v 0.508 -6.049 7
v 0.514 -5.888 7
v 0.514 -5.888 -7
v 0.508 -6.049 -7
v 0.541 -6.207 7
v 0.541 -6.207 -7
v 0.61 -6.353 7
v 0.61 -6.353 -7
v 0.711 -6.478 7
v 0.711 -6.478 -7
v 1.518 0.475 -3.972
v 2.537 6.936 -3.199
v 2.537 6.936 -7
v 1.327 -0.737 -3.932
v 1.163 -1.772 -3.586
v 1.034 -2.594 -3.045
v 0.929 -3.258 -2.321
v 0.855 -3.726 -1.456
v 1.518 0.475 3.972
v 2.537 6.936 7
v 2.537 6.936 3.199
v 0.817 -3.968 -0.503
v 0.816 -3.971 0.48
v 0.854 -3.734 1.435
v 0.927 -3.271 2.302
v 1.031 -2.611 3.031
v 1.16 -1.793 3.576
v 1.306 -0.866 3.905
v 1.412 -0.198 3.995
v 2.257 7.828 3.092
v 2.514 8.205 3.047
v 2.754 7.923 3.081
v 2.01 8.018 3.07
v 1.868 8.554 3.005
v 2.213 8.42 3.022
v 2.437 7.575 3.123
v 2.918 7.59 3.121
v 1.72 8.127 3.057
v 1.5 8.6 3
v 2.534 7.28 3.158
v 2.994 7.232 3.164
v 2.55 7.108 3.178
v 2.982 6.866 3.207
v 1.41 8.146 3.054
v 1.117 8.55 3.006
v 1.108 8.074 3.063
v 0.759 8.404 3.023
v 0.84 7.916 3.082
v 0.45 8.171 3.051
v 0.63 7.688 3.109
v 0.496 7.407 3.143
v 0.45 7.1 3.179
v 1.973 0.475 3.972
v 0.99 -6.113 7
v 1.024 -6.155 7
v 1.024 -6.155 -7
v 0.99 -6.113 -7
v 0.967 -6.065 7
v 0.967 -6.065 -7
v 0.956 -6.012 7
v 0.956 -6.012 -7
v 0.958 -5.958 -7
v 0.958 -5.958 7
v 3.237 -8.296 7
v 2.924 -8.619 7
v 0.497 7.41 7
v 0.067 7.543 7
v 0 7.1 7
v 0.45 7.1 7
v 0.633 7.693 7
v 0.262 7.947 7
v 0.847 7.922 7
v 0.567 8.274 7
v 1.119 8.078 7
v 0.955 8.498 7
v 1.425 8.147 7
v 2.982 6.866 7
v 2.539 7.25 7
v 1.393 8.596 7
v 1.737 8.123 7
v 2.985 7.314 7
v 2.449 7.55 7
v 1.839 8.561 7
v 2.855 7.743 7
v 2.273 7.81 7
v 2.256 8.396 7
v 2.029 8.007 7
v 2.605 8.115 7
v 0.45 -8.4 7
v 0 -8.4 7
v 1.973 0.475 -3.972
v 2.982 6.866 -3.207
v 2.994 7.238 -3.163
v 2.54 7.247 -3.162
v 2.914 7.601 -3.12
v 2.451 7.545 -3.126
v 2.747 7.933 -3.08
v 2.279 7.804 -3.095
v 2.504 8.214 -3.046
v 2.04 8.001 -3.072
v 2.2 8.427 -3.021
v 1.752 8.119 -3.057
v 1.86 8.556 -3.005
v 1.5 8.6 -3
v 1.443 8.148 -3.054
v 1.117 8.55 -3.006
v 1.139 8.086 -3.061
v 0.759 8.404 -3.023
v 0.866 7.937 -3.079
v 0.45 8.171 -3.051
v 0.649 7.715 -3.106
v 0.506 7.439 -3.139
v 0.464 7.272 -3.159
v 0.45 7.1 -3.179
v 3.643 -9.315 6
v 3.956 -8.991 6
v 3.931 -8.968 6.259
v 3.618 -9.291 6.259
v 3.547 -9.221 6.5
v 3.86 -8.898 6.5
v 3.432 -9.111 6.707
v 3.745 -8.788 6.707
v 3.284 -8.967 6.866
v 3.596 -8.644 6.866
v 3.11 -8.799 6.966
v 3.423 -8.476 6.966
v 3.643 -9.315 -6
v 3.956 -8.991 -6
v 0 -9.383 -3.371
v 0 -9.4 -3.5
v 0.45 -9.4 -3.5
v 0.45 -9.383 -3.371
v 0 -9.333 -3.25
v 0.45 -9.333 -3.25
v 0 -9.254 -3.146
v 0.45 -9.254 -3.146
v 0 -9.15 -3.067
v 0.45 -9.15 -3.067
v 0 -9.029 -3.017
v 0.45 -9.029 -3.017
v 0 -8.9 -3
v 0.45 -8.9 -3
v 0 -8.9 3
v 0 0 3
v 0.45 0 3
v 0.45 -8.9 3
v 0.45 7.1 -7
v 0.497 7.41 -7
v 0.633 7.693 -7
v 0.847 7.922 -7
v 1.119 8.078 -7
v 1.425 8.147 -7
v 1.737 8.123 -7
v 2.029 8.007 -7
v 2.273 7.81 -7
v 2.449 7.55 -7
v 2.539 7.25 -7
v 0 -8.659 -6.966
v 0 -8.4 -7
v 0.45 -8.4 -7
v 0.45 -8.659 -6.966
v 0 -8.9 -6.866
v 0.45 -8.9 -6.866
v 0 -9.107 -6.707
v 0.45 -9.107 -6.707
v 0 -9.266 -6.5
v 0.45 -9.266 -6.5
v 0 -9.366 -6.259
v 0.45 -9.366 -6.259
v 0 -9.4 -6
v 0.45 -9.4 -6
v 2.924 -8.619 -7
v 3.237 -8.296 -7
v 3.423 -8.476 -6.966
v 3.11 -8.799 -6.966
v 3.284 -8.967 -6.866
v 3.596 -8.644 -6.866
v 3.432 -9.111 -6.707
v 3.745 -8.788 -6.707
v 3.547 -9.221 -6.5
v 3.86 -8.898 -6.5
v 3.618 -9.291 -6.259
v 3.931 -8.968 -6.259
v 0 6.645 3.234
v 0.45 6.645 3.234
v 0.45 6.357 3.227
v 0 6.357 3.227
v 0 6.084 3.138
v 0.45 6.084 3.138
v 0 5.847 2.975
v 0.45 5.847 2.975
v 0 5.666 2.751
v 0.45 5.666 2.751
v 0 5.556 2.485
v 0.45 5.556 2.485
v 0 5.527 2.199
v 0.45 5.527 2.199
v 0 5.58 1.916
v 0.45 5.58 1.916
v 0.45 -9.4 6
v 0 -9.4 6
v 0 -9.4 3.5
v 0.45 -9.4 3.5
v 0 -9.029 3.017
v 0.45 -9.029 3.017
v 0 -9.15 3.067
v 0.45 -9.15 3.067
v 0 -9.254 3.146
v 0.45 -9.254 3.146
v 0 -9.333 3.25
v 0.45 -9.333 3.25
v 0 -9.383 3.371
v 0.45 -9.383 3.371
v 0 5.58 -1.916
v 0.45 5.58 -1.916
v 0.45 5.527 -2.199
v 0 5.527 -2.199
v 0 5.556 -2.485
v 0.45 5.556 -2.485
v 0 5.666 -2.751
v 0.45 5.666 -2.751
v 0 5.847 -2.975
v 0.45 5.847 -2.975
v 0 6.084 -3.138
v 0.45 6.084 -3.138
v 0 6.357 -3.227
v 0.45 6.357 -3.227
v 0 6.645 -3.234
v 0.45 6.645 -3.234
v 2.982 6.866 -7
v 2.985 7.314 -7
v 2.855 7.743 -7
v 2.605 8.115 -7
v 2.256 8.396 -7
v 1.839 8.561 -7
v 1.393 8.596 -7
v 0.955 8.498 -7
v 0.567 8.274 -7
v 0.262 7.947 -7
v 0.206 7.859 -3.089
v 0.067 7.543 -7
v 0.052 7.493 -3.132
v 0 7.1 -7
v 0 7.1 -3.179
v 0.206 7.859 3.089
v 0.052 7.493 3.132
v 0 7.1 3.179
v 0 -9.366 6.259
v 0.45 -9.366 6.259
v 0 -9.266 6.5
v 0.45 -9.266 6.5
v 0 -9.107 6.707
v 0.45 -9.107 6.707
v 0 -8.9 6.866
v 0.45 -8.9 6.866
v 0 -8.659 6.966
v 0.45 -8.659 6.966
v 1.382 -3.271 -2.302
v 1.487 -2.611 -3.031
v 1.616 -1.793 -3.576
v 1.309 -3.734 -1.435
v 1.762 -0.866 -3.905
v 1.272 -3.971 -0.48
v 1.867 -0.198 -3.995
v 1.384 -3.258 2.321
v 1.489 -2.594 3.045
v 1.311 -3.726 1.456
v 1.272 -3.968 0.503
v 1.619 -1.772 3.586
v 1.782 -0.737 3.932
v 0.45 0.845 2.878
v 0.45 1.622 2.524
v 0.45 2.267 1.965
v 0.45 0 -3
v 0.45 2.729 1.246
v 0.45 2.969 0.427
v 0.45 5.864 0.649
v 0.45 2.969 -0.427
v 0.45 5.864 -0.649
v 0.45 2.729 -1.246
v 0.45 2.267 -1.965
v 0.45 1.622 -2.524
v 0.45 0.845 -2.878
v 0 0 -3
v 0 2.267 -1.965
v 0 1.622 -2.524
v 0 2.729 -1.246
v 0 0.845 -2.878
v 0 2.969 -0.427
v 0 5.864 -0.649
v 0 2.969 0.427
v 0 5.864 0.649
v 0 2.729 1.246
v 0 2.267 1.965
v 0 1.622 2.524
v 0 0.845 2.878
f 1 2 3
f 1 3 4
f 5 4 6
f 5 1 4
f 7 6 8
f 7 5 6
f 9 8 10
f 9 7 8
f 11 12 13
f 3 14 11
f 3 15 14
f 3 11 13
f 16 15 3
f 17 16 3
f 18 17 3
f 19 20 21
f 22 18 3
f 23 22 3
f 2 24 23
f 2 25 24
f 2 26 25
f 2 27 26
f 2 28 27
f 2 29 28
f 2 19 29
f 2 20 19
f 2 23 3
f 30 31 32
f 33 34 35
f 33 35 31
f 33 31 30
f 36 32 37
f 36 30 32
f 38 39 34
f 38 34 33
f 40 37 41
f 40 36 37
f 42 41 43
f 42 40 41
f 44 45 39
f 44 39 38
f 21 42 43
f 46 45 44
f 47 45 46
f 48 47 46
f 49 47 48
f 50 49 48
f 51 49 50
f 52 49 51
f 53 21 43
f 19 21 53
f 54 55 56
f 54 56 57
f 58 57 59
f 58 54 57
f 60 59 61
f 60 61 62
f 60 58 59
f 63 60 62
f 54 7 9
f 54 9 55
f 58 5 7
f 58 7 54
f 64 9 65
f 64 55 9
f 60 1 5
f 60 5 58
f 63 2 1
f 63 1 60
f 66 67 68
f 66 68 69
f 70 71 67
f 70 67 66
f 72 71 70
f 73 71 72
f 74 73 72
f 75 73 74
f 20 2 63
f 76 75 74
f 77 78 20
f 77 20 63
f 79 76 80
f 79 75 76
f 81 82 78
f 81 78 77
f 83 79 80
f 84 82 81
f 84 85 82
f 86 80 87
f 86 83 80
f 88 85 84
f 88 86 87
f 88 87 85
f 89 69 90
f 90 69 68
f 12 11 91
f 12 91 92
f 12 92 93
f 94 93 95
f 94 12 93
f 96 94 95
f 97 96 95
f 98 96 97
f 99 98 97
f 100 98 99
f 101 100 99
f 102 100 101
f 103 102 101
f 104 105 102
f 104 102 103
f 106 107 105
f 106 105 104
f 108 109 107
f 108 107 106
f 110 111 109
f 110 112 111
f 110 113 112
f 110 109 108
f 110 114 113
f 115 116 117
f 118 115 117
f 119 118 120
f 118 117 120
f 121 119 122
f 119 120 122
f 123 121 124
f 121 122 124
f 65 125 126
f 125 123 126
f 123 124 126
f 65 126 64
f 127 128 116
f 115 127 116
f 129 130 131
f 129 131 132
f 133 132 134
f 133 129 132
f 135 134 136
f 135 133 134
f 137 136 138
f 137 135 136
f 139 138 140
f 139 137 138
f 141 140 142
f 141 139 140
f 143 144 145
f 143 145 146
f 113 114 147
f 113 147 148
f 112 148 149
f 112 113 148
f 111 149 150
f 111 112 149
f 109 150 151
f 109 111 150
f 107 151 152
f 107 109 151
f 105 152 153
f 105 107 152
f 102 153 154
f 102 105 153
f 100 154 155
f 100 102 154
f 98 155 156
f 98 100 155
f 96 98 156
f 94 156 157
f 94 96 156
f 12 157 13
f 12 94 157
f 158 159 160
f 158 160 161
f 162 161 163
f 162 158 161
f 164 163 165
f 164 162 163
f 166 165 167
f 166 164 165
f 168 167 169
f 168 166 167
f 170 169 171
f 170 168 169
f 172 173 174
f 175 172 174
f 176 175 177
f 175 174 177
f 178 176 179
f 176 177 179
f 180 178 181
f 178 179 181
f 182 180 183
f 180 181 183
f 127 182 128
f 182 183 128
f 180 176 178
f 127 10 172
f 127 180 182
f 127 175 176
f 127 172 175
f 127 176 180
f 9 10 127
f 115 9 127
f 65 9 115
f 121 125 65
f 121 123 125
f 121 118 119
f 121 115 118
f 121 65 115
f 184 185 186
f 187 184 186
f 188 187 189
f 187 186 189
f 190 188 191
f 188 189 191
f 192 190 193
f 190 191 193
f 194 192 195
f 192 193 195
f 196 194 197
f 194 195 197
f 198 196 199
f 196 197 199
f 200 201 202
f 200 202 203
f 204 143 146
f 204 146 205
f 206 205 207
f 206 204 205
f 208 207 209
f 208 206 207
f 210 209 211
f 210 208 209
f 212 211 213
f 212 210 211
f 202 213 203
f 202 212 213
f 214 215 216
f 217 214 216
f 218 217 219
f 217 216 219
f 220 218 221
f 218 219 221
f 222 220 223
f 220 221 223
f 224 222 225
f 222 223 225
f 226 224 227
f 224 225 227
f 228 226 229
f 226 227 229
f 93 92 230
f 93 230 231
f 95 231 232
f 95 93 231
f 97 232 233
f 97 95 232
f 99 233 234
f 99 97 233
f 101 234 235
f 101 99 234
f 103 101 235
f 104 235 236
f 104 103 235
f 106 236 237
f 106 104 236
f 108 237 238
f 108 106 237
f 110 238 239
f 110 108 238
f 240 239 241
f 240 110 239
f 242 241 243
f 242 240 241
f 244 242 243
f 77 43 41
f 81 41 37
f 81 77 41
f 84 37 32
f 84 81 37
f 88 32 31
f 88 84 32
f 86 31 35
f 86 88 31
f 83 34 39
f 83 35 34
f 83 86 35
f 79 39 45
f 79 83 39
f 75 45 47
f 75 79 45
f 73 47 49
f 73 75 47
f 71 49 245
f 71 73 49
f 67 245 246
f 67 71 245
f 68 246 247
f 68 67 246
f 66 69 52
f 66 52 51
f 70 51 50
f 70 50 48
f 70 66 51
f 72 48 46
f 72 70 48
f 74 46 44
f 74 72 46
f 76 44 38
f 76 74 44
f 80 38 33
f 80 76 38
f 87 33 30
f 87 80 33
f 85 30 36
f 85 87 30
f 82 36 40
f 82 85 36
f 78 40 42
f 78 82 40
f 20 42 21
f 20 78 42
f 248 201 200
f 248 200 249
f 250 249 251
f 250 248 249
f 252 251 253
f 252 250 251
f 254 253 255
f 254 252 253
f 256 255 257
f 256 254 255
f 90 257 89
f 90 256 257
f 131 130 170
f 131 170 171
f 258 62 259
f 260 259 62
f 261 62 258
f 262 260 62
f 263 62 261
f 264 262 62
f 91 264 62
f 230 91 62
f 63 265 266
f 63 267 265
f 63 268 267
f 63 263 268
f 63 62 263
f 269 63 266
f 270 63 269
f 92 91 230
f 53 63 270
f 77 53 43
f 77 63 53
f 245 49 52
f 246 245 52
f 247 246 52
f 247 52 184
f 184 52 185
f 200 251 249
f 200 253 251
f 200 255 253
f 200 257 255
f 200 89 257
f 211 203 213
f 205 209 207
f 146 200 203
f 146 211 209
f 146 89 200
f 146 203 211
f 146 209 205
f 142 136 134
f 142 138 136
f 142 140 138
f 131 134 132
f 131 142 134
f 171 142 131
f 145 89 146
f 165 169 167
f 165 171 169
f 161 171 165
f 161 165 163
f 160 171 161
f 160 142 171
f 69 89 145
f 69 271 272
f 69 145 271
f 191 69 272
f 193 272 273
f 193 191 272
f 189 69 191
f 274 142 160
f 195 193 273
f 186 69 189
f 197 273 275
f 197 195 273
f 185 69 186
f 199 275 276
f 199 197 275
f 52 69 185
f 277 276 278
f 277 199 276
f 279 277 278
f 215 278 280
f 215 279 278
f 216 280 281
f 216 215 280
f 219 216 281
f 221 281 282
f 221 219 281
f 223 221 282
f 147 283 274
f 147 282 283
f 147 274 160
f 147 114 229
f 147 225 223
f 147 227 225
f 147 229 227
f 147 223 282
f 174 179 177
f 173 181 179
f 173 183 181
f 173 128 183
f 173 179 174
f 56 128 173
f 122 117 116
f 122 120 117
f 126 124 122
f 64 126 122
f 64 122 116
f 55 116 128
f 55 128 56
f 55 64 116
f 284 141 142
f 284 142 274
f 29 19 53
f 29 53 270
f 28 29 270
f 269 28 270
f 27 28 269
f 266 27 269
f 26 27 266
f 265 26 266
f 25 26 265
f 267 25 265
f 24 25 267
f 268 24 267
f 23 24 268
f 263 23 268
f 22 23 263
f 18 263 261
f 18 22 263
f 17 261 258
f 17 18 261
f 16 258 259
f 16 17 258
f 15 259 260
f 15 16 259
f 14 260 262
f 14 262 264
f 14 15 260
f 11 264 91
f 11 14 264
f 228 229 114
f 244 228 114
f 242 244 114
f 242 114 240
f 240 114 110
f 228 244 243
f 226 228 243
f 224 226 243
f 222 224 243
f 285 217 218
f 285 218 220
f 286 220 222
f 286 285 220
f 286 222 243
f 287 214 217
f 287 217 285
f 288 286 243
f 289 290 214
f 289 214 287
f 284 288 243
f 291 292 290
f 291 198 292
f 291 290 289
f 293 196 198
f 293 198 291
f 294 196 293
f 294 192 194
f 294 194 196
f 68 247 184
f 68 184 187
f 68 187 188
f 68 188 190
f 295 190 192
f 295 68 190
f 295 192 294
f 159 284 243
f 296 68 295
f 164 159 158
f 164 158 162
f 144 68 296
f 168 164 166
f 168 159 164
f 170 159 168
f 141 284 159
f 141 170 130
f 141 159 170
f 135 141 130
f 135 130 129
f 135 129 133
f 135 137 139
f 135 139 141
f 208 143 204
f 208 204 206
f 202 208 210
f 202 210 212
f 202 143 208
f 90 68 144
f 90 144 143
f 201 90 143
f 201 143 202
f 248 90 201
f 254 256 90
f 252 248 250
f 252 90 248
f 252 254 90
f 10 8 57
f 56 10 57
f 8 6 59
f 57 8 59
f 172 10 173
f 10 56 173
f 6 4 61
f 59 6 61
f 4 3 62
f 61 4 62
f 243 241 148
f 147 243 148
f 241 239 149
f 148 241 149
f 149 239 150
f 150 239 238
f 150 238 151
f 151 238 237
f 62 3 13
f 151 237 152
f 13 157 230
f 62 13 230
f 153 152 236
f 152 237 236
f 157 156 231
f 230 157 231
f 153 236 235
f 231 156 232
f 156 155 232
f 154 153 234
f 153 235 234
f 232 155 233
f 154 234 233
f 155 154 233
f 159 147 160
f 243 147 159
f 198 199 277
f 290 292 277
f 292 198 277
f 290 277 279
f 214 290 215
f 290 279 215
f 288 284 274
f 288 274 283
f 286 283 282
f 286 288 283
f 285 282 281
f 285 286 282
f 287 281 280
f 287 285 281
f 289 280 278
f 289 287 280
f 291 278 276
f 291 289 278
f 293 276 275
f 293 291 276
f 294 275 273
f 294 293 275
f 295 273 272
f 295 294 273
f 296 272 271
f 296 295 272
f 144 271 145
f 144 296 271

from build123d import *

# Parameters (mm, degrees)
BOSS_EXTRUDE1_DEPTH      = 7
BOSS_EXTRUDE1_DEPTH_BACK = 7
CUT_EXTRUDE1_DEPTH       = 0.45
CUT_EXTRUDE2_DEPTH       = 3.9
CUT_EXTRUDE3_DEPTH       = 3.9
CUT_EXTRUDE4_DEPTH       = 0.45
CUT_EXTRUDE5_DEPTH       = 0.45
CUT_EXTRUDE6_DEPTH       = 0.45
CUT_EXTRUDE7_DEPTH       = 0.45
CUT_EXTRUDE8_DEPTH       = 0.9
CUT_EXTRUDE8_DEPTH_BACK  = 0.9


with BuildPart() as part:
    # Sketch1 → Boss-Extrude1 (new, two sides: drawn at the far end of the back side and taken through both)
    with BuildSketch(Plane.XY.offset(-BOSS_EXTRUDE1_DEPTH_BACK)):
        with BuildLine():
            Line((0, 7.1), (0, -9.4))
            Line((0, -9.4), (0.45, -9.4))
            Line((0.45, -9.4), (0.45, 7.1))
            ThreePointArc((0.45, 7.1), (1.582064395, 8.146788152), (2.537172257, 6.936373264))
            Line((2.537172257, 6.936373264), (0.513952578, -5.888103783))
            ThreePointArc((0.513952578, -5.888103783), (0.540554577, -6.207374008), (0.711367038, -6.478416895))
            Line((0.711367038, -6.478416895), (3.64329211, -9.314940681))
            Line((3.64329211, -9.314940681), (3.956184866, -8.99152435))
            Line((3.956184866, -8.99152435), (1.024259794, -6.155000564))
            ThreePointArc((1.024259794, -6.155000564), (0.967322307, -6.064652935), (0.958454974, -5.958229527))
            Line((0.958454974, -5.958229527), (2.981674653, 6.86624752))
            ThreePointArc((2.981674653, 6.86624752), (1.61723485, 8.595411646), (0, 7.1))
        make_face()
    extrude(amount=BOSS_EXTRUDE1_DEPTH + BOSS_EXTRUDE1_DEPTH_BACK)

    # Sketch2 → Cut-Extrude1 (cut)
    with BuildSketch(Plane(origin=(0, 0, 0), x_dir=(0, 0, -1), z_dir=(1, 0, 0))):
        with BuildLine():
            Line((-3, 0), (-3, -9.4))
            Line((-3, -9.4), (3, -9.4))
            Line((3, -9.4), (3, 0))
            ThreePointArc((3, 0), (0, 3), (-3, 0))
        make_face()
    extrude(amount=CUT_EXTRUDE1_DEPTH, mode=Mode.SUBTRACT)

    # Sketch3 → Cut-Extrude2 (cut)
    with BuildSketch(Plane(origin=(0.45, 0, 0), x_dir=(0, 0, -1), z_dir=(1, 0, 0))):
        with BuildLine():
            Line((3.97169805, 0.474989052), (3, 8.6))
            Line((3, 8.6), (-3, 8.6))
            Line((-3, 8.6), (-3.97169805, 0.474989052))
            ThreePointArc((-3.97169805, 0.474989052), (0, -4), (3.97169805, 0.474989052))
        make_face()
    extrude(amount=CUT_EXTRUDE2_DEPTH, mode=Mode.SUBTRACT)

    # Sketch4 → Cut-Extrude3 (cut)
    with BuildSketch(Plane(origin=(0.45, 0, 0), x_dir=(0, 0, -1), z_dir=(1, 0, 0))):
        with BuildLine():
            Line((3.233838828, 6.644718687), (3, 8.6))
            Line((3, 8.6), (-3, 8.6))
            Line((-3, 8.6), (-3.233838828, 6.644718687))
            ThreePointArc((-3.233838828, 6.644718687), (-2.869340143, 5.748101911), (-1.916144125, 5.580178464))
            ThreePointArc((-1.916144125, 5.580178464), (0, 5.9), (1.916144125, 5.580178464))
            ThreePointArc((1.916144125, 5.580178464), (2.869340143, 5.748101911), (3.233838828, 6.644718687))
        make_face()
    extrude(amount=-CUT_EXTRUDE3_DEPTH, mode=Mode.SUBTRACT)

    # Sketch5 → Cut-Extrude4 (cut)
    with BuildSketch(Plane(origin=(0, 0, 0), x_dir=(0, 0, -1), z_dir=(1, 0, 0))):
        with BuildLine():
            Line((-7, -9.4), (-6, -9.4))
            ThreePointArc((-6, -9.4), (-6.707106781, -9.107106781), (-7, -8.4))
            Line((-7, -8.4), (-7, -9.4))
        make_face()
    extrude(amount=CUT_EXTRUDE4_DEPTH, mode=Mode.SUBTRACT)

    # Sketch6 → Cut-Extrude5 (cut)
    with BuildSketch(Plane(origin=(0, 0, 0), x_dir=(0, 0, -1), z_dir=(1, 0, 0))):
        with BuildLine():
            Line((6, -9.4), (7, -9.4))
            Line((7, -9.4), (7, -8.4))
            ThreePointArc((7, -8.4), (6.707106781, -9.107106781), (6, -9.4))
        make_face()
    extrude(amount=CUT_EXTRUDE5_DEPTH, mode=Mode.SUBTRACT)

    # Sketch7 → Cut-Extrude6 (cut)
    with BuildSketch(Plane(origin=(0, 0, 0), x_dir=(0, 0, -1), z_dir=(1, 0, 0))):
        with BuildLine():
            Line((3, -9.4), (3.5, -9.4))
            ThreePointArc((3.5, -9.4), (3.146446609, -9.253553391), (3, -8.9))
            Line((3, -8.9), (3, -9.4))
        make_face()
    extrude(amount=CUT_EXTRUDE6_DEPTH, mode=Mode.SUBTRACT)

    # Sketch8 → Cut-Extrude7 (cut)
    with BuildSketch(Plane(origin=(0, 0, 0), x_dir=(0, 0, -1), z_dir=(1, 0, 0))):
        with BuildLine():
            Line((-3.5, -9.4), (-3, -9.4))
            Line((-3, -9.4), (-3, -8.9))
            ThreePointArc((-3, -8.9), (-3.146446609, -9.253553391), (-3.5, -9.4))
        make_face()
    extrude(amount=CUT_EXTRUDE7_DEPTH, mode=Mode.SUBTRACT)

    # Sketch9 → Cut-Extrude8 (cut, two sides: drawn at the far end of the back side and taken through both)
    with BuildSketch(Plane(origin=(-2.580622377, -2.667416888, 0), x_dir=(0.718702958168856, -0.6953172354539585, 0), z_dir=(0.6953172354539585, 0.718702958168856, 0)).offset(-CUT_EXTRUDE8_DEPTH_BACK)):
        with BuildLine():
            Line((8.094816521, -7), (8.094816521, -8))
            Line((8.094816521, -8), (10.094816521, -8))
            Line((10.094816521, -8), (10.094816521, 8))
            Line((10.094816521, 8), (8.094816521, 8))
            Line((8.094816521, 8), (8.094816521, 7))
            ThreePointArc((8.094816521, 7), (8.801923302, 6.707106781), (9.094816521, 6))
            Line((9.094816521, 6), (9.094816521, -6))
            ThreePointArc((9.094816521, -6), (8.801923302, -6.707106781), (8.094816521, -7))
        make_face()
    extrude(amount=CUT_EXTRUDE8_DEPTH + CUT_EXTRUDE8_DEPTH_BACK, mode=Mode.SUBTRACT)


solid = part.part
